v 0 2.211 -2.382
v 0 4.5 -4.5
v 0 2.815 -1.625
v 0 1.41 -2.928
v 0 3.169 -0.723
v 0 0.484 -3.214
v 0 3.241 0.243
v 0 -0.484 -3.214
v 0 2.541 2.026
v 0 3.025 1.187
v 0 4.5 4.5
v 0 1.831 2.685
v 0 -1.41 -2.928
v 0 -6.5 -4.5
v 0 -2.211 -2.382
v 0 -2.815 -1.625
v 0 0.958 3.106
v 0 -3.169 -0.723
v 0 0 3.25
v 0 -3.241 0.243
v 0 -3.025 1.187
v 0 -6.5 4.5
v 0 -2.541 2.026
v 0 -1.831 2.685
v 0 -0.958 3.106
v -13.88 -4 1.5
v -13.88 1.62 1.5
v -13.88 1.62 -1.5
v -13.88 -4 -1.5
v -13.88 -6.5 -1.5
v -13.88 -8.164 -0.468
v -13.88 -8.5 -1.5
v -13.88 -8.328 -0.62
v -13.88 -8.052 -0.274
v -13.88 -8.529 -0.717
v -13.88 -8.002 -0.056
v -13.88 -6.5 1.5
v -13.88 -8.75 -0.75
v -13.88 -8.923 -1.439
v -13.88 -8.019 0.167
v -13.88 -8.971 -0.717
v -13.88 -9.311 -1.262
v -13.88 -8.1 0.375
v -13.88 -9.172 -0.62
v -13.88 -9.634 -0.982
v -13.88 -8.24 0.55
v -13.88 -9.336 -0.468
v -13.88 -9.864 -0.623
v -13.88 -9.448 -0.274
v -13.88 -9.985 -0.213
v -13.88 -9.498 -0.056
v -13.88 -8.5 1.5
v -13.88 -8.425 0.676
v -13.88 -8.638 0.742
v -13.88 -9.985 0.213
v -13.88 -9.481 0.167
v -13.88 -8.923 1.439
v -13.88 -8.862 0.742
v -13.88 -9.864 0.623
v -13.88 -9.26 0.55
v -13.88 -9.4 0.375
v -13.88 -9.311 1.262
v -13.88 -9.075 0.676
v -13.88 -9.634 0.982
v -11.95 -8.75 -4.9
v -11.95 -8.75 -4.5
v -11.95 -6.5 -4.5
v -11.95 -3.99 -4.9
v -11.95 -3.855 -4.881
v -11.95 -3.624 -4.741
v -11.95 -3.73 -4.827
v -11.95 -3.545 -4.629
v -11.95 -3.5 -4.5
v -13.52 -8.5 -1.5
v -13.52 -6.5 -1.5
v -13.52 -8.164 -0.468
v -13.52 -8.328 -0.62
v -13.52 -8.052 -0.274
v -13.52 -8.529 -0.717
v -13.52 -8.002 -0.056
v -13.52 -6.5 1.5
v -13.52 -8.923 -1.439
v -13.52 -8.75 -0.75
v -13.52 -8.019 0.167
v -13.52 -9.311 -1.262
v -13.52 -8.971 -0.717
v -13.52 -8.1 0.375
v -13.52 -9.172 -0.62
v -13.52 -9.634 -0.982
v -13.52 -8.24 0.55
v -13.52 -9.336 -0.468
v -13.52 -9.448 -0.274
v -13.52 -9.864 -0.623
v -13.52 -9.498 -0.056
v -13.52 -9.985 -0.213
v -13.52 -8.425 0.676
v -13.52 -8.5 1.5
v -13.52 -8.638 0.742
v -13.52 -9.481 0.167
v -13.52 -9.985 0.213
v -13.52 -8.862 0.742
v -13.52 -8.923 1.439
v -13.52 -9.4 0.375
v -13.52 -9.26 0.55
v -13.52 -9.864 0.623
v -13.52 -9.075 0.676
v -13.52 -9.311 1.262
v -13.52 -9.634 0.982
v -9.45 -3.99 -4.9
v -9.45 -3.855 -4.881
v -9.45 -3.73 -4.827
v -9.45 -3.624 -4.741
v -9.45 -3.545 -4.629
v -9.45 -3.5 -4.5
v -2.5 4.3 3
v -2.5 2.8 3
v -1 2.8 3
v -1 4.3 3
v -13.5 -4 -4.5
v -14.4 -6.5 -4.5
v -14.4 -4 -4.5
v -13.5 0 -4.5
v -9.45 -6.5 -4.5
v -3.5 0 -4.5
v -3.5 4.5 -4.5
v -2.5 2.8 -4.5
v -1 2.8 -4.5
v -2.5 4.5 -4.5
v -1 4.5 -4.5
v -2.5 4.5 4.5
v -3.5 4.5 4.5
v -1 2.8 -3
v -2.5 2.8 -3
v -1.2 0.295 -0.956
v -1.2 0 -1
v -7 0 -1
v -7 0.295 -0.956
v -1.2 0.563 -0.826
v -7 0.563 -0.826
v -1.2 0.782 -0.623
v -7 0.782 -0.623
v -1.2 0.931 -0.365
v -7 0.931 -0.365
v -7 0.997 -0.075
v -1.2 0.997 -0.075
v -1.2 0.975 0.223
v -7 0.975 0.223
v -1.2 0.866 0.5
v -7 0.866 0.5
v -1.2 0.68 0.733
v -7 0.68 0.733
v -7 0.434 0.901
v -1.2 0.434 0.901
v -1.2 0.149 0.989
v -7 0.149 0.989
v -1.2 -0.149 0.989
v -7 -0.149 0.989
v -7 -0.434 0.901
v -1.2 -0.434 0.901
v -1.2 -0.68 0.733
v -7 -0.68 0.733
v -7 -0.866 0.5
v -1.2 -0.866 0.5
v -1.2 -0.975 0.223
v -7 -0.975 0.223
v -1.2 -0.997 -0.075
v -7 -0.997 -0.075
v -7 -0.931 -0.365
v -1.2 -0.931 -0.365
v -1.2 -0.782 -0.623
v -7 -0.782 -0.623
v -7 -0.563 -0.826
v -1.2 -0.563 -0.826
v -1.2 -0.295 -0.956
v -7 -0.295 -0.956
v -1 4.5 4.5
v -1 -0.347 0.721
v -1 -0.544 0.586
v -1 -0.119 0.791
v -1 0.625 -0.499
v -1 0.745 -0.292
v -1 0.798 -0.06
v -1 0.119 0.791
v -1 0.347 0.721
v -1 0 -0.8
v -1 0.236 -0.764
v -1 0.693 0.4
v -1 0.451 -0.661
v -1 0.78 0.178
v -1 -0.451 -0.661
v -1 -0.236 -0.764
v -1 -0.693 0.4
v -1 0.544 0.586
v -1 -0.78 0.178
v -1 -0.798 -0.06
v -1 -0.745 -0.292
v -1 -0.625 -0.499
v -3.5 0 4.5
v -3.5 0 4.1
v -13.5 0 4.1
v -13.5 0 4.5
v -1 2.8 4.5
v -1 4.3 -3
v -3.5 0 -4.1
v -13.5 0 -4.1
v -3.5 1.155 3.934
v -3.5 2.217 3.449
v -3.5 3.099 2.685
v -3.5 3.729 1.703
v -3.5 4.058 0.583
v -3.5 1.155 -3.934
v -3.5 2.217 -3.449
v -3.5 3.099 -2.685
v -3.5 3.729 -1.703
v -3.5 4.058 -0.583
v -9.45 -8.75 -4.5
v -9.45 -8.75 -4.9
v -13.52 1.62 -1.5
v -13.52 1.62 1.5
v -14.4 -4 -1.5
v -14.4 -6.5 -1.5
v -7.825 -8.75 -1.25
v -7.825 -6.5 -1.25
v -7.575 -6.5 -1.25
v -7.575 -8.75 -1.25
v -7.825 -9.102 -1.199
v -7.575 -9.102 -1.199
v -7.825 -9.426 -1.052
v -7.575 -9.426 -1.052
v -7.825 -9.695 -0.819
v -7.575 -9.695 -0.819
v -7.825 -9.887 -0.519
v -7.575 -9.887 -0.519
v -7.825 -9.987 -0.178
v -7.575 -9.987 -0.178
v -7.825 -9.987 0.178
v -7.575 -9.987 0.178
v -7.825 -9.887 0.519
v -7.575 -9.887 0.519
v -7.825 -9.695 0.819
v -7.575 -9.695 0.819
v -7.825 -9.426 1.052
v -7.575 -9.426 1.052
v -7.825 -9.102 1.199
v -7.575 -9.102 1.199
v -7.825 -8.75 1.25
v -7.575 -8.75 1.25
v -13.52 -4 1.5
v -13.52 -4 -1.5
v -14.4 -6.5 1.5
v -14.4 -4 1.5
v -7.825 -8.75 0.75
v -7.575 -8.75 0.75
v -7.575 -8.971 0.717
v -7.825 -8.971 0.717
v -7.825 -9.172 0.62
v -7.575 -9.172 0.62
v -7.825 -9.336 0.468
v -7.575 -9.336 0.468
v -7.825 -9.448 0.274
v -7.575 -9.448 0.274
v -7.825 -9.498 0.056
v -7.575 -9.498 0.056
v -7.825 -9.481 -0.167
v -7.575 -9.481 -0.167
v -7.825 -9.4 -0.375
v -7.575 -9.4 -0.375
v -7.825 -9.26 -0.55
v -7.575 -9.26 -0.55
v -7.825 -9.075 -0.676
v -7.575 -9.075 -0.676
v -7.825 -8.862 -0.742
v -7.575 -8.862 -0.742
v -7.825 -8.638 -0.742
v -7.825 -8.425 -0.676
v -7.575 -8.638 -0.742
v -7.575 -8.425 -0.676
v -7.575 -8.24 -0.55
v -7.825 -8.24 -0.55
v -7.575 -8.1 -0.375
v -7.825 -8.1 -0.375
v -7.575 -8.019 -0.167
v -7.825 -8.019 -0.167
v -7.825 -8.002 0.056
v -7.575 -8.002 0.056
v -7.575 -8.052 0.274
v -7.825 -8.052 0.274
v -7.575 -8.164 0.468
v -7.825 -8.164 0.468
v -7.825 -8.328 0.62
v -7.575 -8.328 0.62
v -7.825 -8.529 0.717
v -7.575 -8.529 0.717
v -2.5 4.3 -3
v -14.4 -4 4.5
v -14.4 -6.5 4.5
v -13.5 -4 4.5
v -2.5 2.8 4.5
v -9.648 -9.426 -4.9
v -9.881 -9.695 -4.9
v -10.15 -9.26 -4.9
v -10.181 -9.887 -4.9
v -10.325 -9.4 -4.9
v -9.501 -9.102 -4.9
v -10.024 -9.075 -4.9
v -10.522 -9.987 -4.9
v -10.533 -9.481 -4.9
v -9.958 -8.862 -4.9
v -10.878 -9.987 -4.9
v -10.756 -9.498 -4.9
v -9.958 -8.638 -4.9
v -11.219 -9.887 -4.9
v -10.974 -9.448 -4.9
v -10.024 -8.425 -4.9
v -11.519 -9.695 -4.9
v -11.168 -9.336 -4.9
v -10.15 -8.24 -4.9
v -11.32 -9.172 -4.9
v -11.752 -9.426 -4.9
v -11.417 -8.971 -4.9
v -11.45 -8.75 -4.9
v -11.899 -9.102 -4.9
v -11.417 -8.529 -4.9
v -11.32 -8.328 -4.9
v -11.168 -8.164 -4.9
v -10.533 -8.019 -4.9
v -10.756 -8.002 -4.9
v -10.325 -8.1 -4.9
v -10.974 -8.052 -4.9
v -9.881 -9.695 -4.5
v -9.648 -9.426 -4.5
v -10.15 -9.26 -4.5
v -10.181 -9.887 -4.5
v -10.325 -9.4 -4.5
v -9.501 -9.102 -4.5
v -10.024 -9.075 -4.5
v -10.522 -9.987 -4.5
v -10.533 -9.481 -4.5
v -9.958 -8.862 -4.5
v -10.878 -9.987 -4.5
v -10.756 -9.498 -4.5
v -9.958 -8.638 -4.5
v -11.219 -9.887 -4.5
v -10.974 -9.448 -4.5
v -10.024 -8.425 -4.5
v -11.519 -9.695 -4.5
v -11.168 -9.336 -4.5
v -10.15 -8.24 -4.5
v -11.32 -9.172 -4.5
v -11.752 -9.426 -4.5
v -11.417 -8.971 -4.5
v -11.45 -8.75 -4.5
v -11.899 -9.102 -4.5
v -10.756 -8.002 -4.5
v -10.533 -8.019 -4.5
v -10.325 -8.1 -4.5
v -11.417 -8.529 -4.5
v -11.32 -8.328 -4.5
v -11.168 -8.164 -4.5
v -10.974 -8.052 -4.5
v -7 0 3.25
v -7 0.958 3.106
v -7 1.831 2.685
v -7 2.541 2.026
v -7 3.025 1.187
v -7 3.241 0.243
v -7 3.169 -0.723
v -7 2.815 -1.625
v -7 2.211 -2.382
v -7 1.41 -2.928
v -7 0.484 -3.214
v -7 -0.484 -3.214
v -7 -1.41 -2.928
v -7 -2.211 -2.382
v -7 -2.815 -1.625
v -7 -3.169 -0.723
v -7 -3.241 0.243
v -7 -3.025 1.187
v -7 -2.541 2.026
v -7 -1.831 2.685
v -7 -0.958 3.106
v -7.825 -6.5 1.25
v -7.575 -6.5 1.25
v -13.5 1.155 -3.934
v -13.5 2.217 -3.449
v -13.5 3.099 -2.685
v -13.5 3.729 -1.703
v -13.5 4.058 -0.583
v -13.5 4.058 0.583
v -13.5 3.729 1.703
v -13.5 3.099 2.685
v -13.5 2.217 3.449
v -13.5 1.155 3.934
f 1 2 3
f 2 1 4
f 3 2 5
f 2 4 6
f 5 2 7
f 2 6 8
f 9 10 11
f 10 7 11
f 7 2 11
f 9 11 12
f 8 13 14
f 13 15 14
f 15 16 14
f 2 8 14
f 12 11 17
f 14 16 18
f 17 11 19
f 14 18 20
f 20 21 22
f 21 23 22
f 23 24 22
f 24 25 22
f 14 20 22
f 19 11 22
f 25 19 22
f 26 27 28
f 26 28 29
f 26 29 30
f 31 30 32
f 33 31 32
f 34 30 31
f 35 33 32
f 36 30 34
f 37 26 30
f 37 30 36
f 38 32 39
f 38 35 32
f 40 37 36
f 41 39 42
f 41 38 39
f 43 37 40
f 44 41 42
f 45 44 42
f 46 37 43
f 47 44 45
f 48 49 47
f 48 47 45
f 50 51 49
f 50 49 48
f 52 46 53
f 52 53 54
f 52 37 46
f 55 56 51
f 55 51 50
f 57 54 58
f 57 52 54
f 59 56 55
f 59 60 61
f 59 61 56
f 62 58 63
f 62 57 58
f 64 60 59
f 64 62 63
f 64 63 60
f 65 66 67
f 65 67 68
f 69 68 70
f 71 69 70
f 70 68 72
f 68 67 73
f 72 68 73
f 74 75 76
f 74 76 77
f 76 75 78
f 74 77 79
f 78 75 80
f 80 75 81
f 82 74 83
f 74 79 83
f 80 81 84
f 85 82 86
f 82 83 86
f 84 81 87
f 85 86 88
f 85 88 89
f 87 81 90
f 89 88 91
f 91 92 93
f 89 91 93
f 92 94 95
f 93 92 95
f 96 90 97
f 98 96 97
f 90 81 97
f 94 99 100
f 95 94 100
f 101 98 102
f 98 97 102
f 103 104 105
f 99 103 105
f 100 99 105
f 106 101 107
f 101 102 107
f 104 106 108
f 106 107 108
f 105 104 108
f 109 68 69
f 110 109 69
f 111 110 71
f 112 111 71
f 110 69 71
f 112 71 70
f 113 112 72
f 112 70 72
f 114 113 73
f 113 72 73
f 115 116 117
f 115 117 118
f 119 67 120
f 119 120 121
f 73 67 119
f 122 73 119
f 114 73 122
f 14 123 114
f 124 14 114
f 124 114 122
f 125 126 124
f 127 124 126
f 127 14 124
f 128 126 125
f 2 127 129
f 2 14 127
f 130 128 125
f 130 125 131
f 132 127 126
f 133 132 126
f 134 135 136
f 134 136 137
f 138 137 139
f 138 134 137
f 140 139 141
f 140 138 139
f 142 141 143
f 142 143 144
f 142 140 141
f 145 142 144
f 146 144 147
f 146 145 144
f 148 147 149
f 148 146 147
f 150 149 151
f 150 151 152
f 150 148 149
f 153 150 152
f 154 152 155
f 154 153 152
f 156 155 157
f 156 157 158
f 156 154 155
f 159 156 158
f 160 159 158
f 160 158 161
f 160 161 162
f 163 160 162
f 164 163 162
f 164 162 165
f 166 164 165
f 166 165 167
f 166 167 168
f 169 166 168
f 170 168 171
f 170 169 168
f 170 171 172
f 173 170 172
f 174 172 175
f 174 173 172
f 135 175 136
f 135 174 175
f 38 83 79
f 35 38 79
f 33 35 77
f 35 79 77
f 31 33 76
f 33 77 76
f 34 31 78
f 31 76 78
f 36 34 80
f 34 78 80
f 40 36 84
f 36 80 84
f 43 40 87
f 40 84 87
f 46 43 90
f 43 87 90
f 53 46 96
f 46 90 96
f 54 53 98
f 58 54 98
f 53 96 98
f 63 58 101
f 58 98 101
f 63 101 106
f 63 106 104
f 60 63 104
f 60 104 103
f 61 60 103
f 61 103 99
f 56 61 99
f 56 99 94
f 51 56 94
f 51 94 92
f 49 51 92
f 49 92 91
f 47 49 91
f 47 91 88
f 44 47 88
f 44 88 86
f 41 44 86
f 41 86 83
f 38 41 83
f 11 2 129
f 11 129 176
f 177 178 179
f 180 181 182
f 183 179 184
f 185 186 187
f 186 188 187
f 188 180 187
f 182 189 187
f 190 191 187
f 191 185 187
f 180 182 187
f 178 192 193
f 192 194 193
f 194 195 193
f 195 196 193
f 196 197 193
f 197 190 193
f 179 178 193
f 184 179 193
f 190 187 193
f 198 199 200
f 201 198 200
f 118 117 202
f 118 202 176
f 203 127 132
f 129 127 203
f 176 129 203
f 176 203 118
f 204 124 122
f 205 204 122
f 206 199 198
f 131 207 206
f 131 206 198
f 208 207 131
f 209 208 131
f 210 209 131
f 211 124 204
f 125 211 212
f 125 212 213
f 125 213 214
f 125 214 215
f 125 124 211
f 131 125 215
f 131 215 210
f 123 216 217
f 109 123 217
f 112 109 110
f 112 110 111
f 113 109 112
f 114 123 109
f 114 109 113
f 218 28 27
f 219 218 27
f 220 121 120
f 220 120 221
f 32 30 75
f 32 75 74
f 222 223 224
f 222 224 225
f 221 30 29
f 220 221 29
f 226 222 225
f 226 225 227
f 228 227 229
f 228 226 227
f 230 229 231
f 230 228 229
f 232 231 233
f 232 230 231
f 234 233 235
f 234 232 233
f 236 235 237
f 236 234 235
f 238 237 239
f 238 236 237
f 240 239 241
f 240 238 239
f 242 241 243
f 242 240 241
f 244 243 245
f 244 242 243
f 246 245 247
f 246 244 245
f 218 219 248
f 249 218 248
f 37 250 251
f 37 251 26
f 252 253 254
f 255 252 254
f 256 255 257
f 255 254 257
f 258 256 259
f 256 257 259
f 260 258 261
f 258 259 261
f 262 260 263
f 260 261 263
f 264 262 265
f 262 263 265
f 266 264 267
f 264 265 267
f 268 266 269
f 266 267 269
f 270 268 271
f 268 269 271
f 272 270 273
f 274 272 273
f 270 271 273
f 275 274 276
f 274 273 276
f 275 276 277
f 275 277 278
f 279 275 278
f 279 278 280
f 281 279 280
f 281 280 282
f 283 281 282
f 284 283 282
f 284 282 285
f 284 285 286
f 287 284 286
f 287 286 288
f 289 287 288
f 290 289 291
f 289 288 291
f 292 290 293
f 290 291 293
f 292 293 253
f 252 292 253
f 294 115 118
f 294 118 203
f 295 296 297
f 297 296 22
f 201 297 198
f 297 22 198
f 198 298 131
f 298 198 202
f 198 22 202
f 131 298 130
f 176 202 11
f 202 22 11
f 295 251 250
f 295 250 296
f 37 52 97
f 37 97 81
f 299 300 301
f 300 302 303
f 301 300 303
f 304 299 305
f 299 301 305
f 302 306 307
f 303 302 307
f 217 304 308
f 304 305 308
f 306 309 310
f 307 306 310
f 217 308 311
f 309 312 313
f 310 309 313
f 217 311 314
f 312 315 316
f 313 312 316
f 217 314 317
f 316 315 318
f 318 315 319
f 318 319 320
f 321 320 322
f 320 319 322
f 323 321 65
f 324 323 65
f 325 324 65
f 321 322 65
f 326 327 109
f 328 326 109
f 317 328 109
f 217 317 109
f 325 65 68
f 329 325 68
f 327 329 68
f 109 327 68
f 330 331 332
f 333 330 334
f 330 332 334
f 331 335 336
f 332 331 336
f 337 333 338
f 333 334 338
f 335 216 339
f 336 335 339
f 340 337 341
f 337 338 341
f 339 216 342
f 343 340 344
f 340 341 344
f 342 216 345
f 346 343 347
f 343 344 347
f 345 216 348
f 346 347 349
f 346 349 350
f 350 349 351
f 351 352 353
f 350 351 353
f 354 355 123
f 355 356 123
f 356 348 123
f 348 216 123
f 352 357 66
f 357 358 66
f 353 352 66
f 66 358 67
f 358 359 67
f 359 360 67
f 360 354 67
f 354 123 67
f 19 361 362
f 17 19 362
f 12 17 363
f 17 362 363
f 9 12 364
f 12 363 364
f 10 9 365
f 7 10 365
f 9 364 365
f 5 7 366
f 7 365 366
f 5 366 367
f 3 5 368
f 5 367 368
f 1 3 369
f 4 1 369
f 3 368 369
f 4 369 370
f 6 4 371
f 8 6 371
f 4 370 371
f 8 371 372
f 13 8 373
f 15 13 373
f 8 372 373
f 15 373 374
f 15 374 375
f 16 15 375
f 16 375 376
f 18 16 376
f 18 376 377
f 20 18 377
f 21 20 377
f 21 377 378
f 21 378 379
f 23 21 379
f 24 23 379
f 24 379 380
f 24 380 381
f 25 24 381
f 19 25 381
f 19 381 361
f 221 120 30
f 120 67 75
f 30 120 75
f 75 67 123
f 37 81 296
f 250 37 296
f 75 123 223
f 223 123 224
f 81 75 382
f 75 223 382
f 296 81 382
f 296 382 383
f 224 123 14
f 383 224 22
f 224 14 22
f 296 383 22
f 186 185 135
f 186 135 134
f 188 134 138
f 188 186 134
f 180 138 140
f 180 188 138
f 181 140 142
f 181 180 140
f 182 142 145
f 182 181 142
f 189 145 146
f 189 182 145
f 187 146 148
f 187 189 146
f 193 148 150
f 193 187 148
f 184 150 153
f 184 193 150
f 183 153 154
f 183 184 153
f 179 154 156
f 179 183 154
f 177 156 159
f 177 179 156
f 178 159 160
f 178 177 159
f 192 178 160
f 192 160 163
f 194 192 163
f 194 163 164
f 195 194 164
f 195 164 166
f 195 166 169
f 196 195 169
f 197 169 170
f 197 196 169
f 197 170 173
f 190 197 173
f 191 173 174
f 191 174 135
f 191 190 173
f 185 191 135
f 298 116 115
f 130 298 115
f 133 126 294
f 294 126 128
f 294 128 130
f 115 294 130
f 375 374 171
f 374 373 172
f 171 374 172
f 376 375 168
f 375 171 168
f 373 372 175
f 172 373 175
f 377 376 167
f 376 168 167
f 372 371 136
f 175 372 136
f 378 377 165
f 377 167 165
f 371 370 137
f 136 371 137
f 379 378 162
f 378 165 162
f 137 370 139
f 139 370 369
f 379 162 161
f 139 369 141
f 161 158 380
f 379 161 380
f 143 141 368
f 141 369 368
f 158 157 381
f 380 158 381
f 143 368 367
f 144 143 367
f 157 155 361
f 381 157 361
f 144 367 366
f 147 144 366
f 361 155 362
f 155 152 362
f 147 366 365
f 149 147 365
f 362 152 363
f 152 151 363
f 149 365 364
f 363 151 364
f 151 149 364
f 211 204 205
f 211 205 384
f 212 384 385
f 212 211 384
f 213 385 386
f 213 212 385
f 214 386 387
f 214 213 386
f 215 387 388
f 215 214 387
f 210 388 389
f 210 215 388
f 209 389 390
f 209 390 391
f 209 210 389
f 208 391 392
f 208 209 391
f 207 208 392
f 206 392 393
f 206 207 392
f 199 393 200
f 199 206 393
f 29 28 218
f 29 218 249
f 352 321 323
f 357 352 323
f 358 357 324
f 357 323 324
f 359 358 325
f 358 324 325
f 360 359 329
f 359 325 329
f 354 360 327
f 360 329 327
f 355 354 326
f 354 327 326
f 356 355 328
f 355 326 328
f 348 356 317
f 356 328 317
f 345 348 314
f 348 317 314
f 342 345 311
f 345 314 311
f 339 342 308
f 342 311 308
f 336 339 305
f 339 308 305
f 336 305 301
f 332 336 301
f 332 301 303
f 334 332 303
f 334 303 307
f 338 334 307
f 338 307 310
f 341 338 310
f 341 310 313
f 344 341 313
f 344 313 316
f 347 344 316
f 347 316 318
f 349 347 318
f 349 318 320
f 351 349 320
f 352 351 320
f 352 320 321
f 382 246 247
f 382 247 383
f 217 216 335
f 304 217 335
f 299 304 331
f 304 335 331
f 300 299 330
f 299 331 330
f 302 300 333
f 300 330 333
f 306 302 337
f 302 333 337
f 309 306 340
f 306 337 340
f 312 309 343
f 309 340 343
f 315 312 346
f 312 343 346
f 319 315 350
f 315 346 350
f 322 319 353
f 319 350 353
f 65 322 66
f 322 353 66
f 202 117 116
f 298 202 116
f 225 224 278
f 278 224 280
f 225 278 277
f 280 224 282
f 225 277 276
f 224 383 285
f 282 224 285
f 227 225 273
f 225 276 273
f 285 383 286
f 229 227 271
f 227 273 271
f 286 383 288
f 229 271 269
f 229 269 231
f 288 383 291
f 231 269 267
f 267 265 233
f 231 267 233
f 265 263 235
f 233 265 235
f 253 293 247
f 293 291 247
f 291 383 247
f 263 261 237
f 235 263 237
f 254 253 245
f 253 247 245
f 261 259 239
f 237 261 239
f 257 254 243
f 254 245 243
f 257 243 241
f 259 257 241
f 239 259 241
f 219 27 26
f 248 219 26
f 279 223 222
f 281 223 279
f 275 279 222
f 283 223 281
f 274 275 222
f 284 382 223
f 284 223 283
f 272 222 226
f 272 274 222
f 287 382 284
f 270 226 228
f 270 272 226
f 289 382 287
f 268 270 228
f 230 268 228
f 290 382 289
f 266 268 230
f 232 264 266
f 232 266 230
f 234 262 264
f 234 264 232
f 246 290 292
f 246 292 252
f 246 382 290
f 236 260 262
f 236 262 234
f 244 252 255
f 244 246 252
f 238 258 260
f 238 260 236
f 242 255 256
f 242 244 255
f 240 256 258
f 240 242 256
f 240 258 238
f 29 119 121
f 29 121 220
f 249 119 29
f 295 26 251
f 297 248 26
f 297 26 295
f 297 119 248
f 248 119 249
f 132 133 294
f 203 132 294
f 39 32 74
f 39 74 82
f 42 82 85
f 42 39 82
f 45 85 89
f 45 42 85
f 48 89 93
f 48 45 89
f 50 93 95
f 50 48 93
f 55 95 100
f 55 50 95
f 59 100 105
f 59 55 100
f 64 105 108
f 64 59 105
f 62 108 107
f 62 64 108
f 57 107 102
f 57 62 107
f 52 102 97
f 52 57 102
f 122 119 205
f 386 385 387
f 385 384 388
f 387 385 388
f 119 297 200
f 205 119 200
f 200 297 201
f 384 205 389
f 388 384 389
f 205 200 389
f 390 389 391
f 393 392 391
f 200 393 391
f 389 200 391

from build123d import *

# Parameters (mm, degrees)
BOSS_EXTRUDE1_START            = -9
BOSS_EXTRUDE1_DEPTH            = 9
BOSS_EXTRUDE1_2_DEPTH          = 0.4
BOSS_EXTRUDE1_START_2          = -11.95
BOSS_EXTRUDE1_3_DEPTH          = 2.5
SKETCH2_W                      = 9
SKETCH2_H                      = 11
BOSS_EXTRUDE2_DEPTH            = 2.45
SKETCH3_W                      = 0.9
SKETCH3_H                      = 8.5
CUT_EXTRUDE1_DEPTH             = 20.892712233
SKETCH4_W                      = 0.52
SKETCH4_H                      = 6
CUT_EXTRUDE2_DEPTH             = 19.771520983
BOSS_EXTRUDE3_DEPTH            = 0.36
SKETCH6_W                      = 5.62
SKETCH6_H                      = 3
BOSS_EXTRUDE4_DEPTH            = 0.36
SKETCH7_W                      = 3
SKETCH7_H                      = 2.5
BOSS_EXTRUDE5_DEPTH            = 0.52
SKETCH8_W                      = 1.5
SKETCH8_H                      = 1.7
CUT_EXTRUDE3_DEPTH             = 20.7068516
SKETCH9_W                      = 6
SKETCH9_H                      = 1.5
BOSS_EXTRUDE6_DEPTH            = 1.5
SKETCH10_W                     = 10
SKETCH10_H                     = 4.5
CUT_EXTRUDE4_DEPTH             = 20.7068516
BOSS_EXTRUDE7_DEPTH            = 10
BOSS_EXTRUDE8_DEPTH            = 0.25
F_6_5_6_5_DIAMETER_HOLE1_D     = 6.5
F_6_5_6_5_DIAMETER_HOLE1_DEPTH = 7
SKETCH15_W                     = 6
SKETCH15_H                     = 1
SKETCH16_W                     = 0.75
SKETCH16_H                     = 7.825
F_1_5_1_5_DIAMETER_HOLE2_D     = 1.5
F_1_5_1_5_DIAMETER_HOLE3_D     = 1.5
F_1_5_1_5_DIAMETER_HOLE3_DEPTH = 13.88
CHAMFER1_SIZE                  = 0.2


with BuildPart() as part:
    # Boss-Extrude1: read off the stored shape, not the designer's step
    # Boss-Extrude1 outline → Boss-Extrude1 (new body)
    with BuildSketch(Plane(origin=(0, 0, -4.5), x_dir=(-1, 0, 0), z_dir=(0, 0, -1)).offset(BOSS_EXTRUDE1_START)):
        Polygon((11.95, -6.5), (11.95, 4.5), (0, 4.5), (0, -6.5), (9.45, -6.5), align=None)
    extrude(amount=BOSS_EXTRUDE1_DEPTH)

    # Boss-Extrude1 2 outline → Boss-Extrude1 2 (add)
    with BuildSketch(Plane(origin=(0, 0, -4.5), x_dir=(-1, 0, 0), z_dir=(0, 0, -1))):
        with BuildLine():
            Line((11.95, -8.75), (11.95, -6.5))
            Line((11.95, -6.5), (9.45, -6.5))
            Line((9.45, -6.5), (9.45, -8.75))
            ThreePointArc((9.45, -8.75), (10.7, -10), (11.95, -8.75))
        make_face()
    extrude(amount=BOSS_EXTRUDE1_2_DEPTH)

    # Boss-Extrude1 3 outline → Boss-Extrude1 3 (add)
    with BuildSketch(Plane.YZ.offset(BOSS_EXTRUDE1_START_2)):
        with BuildLine():
            Line((-6.5, -4.9), (-3.989897949, -4.9))
            ThreePointArc((-3.989897949, -4.9), (-3.673670183, -4.787298335), (-3.5, -4.5))
            Line((-3.5, -4.5), (-6.5, -4.5))
            Line((-6.5, -4.5), (-6.5, -4.9))
        make_face()
    extrude(amount=BOSS_EXTRUDE1_3_DEPTH)

    # Sketch2 → Boss-Extrude2 (add)
    with BuildSketch(Plane.ZY.offset(11.95)):
        with Locations((0, -1)):
            Rectangle(SKETCH2_W, SKETCH2_H)
    extrude(amount=BOSS_EXTRUDE2_DEPTH)

    # Sketch3 → Cut-Extrude1 (cut, through all)
    with BuildSketch(Plane.XY.offset(4.5)):
        with Locations((-13.95, 0.25)):
            Rectangle(SKETCH3_W, SKETCH3_H)
    extrude(amount=-CUT_EXTRUDE1_DEPTH, mode=Mode.SUBTRACT)

    # Sketch4 → Cut-Extrude2 (cut, through all)
    with BuildSketch(Plane.XZ.offset(6.5)):
        with Locations((-14.14, -1.5)):
            Rectangle(SKETCH4_W, SKETCH4_H)
    extrude(amount=-CUT_EXTRUDE2_DEPTH, mode=Mode.SUBTRACT)

    # Sketch5 → Boss-Extrude3 (add)
    with BuildSketch(Plane(origin=(-13.88, 0, 0), x_dir=(0, -1, 0), z_dir=(-1, 0, 0))):
        with BuildLine():
            Line((6.5, -1.5), (8.5, -1.5))
            ThreePointArc((8.5, -1.5), (10, 0), (8.5, 1.5))
            Line((8.5, 1.5), (6.5, 1.5))
            Line((6.5, 1.5), (6.5, -1.5))
        make_face()
    extrude(amount=-BOSS_EXTRUDE3_DEPTH)

    # Sketch6 → Boss-Extrude4 (add)
    with BuildSketch(Plane(origin=(-13.88, 0, 0), x_dir=(0, -1, 0), z_dir=(-1, 0, 0))):
        with Locations((1.19, 0)):
            Rectangle(SKETCH6_W, SKETCH6_H)
    extrude(amount=-BOSS_EXTRUDE4_DEPTH)

    # Sketch7 → Boss-Extrude5 (add)
    with BuildSketch(Plane.ZY.offset(13.88)):
        with Locations((-3, -5.25)):
            Rectangle(SKETCH7_W, SKETCH7_H)
    extrude(amount=BOSS_EXTRUDE5_DEPTH)

    # Sketch8 → Cut-Extrude3 (cut, through all)
    with BuildSketch(Plane(origin=(0, 0, -4.5), x_dir=(-1, 0, 0), z_dir=(0, 0, -1))):
        with Locations((1.75, 3.65)):
            Rectangle(SKETCH8_W, SKETCH8_H)
    extrude(amount=-CUT_EXTRUDE3_DEPTH, mode=Mode.SUBTRACT)

    # Sketch9 → Boss-Extrude6 (add)
    with BuildSketch(Plane(origin=(-2.5, 0, 0), x_dir=(0, 0, -1), z_dir=(1, 0, 0))):
        with Locations((0, 3.55)):
            Rectangle(SKETCH9_W, SKETCH9_H)
    extrude(amount=BOSS_EXTRUDE6_DEPTH)

    # Sketch10 → Cut-Extrude4 (cut, through all)
    with BuildSketch(Plane(origin=(0, 0, -4.5), x_dir=(-1, 0, 0), z_dir=(0, 0, -1))):
        with Locations((8.5, 2.25)):
            Rectangle(SKETCH10_W, SKETCH10_H)
    extrude(amount=-CUT_EXTRUDE4_DEPTH, mode=Mode.SUBTRACT)

    # Sketch11 → Boss-Extrude7 (add)
    with BuildSketch(Plane.ZY.offset(3.5)):
        with BuildLine():
            Line((4.1, 0), (-4.1, 0))
            ThreePointArc((-4.1, 0), (0, 4.1), (4.1, 0))
        make_face()
    extrude(amount=BOSS_EXTRUDE7_DEPTH)

    # Sketch12 → Boss-Extrude8 (add)
    with BuildSketch(Plane(origin=(-7.825, 0, 0), x_dir=(0, -1, 0), z_dir=(-1, 0, 0))):
        with BuildLine():
            Line((8.75, 1.25), (6.5, 1.25))
            Line((6.5, 1.25), (6.5, -1.25))
            Line((6.5, -1.25), (8.75, -1.25))
            ThreePointArc((8.75, -1.25), (10, 0), (8.75, 1.25))
        make_face()
    extrude(amount=-BOSS_EXTRUDE8_DEPTH)

    # Ø6.5 (6.5) Diameter Hole1
    with Locations(Plane(origin=(0, 0, 0), x_dir=(0, 0, -1), z_dir=(1, 0, 0))):
        with Locations((0, 0)):
            Hole(F_6_5_6_5_DIAMETER_HOLE1_D / 2, depth=F_6_5_6_5_DIAMETER_HOLE1_DEPTH)

    # Sketch15 → Revolve1 (revolve)
    with BuildSketch(Plane.XY, mode=Mode.PRIVATE) as revolve1_sk:
        with Locations((-4, 0.5)):
            Rectangle(SKETCH15_W, SKETCH15_H)
    revolve(revolve1_sk.sketch.rotate(Axis((-7, 0, 0), (1, 0, 0)), 270), axis=Axis((-7, 0, 0), (1, 0, 0)))

    # Sketch16 → Ø1.5 (1.5) Diameter Hole1 (revolve, cut)
    with BuildSketch(Plane(origin=(-7.825, -8.75, 0), x_dir=(0, 0, 1), z_dir=(0, 1, 0))):
        with Locations((0.375, 3.9125)):
            Rectangle(SKETCH16_W, SKETCH16_H)
    revolve(axis=Axis((-14.175, -8.75, 0), (1, 0, 0)), mode=Mode.SUBTRACT)

    # Ø1.5 (1.5) Diameter Hole2 (through all)
    with Locations(Plane.XY.offset(-4.5)):
        with Locations((-10.7, -8.75)):
            Hole(F_1_5_1_5_DIAMETER_HOLE2_D / 2)

    # Ø1.5 (1.5) Diameter Hole3
    with Locations(Plane.ZY.offset(13.88)):
        with Locations((0, -8.75)):
            Hole(F_1_5_1_5_DIAMETER_HOLE3_D / 2, depth=F_1_5_1_5_DIAMETER_HOLE3_DEPTH)

    # Chamfer1
    chamfer1_edges = [part.edges().sort_by_distance(p)[0] for p in [
        (-1, 0, 1),
    ]]
    chamfer(chamfer1_edges, length=CHAMFER1_SIZE)


solid = part.part
